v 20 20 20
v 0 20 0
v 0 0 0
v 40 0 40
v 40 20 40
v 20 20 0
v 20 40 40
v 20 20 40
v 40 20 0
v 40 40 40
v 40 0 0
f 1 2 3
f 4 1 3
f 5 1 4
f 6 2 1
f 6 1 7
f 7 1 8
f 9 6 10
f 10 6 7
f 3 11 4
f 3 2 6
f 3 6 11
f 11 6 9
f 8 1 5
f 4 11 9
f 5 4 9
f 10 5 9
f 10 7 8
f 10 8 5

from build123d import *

# Parameters (mm, degrees)
SKETCH1_W            = 40
SKETCH1_H            = 40
BOSS_EXTRUDE1_DEPTH  = 40
SKETCH2_W            = 20
SKETCH2_H            = 20
CUT_EXTRUDE1_DEPTH   = 40
CUT_EXTRUDE2_DEPTH   = 40
CUT_EXTRUDE6_DEPTH   = 40
CUT_EXTRUDE7_DEPTH   = 19.999
SKETCH7_W            = 19.998
SKETCH7_H            = 19.999
CUT_EXTRUDE8_DEPTH   = 19.999
SKETCH8_W            = 19.999
SKETCH8_H            = 19.999
CUT_EXTRUDE9_DEPTH   = 19.999
SKETCH11_W           = 28.28144282
SKETCH11_H           = 19.999
BOSS_EXTRUDE9_DEPTH  = 0.0009
BOSS_EXTRUDE10_DEPTH = 20
SKETCH14_W           = 57
SKETCH14_H           = 20
CUT_EXTRUDE11_DEPTH  = 20


with BuildPart() as part:
    # Sketch1 → Boss-Extrude1 (new body)
    with BuildSketch(Plane.XY):
        with Locations((20, 20)):
            Rectangle(SKETCH1_W, SKETCH1_H)
    extrude(amount=BOSS_EXTRUDE1_DEPTH)

    # Sketch2 → Cut-Extrude1 (cut)
    with BuildSketch(Plane.XY.offset(40)):
        with Locations((10, 30)):
            Rectangle(SKETCH2_W, SKETCH2_H)
    extrude(amount=-CUT_EXTRUDE1_DEPTH, mode=Mode.SUBTRACT)

    # Sketch3 → Cut-Extrude2 (cut)
    with BuildSketch(Plane.ZY.offset(-20)):
        Polygon((0, 20), (40, 40), (0, 40), align=None)
    extrude(amount=-CUT_EXTRUDE2_DEPTH, mode=Mode.SUBTRACT)

    # Sketch4 → Cut-Extrude6 (cut)
    with BuildSketch(Plane(origin=(0, 0, 0), x_dir=(1, 0, 0), z_dir=(0, 1, 0))):
        Polygon((0, 0), (20, -20), (20, -40), (0, -40), align=None)
    extrude(amount=CUT_EXTRUDE6_DEPTH, mode=Mode.SUBTRACT)

    # Sketch6 → Cut-Extrude7 (cut)
    with BuildSketch(Plane(origin=(0, 0, 0), x_dir=(-1, 0, 0), z_dir=(0, -1, 0))):
        Polygon((-20.001, -39.9999), (-39.999, -39.9999), (-20.001, -20.0019), align=None)
    extrude(amount=-CUT_EXTRUDE7_DEPTH, mode=Mode.SUBTRACT)

    # Sketch7 → Cut-Extrude8 (cut)
    with BuildSketch(Plane(origin=(20.001, 0, 0), x_dir=(0, 0, -1), z_dir=(1, 0, 0))):
        with Locations((-30.0009, 9.9995)):
            Rectangle(SKETCH7_W, SKETCH7_H)
    extrude(amount=-CUT_EXTRUDE8_DEPTH, mode=Mode.SUBTRACT)

    # Sketch8 → Cut-Extrude9 (cut)
    with BuildSketch(Plane(origin=(0, 0, 39.9999), x_dir=(-1, 0, 0), z_dir=(0, 0, -1))):
        with Locations((-29.9995, 9.9995)):
            Rectangle(SKETCH8_W, SKETCH8_H)
    extrude(amount=-CUT_EXTRUDE9_DEPTH, mode=Mode.SUBTRACT)

    # Sketch11 → Boss-Extrude9 (add)
    with BuildSketch(Plane(origin=(-0.00045, 0, 0.00045), x_dir=(0.707106781, 0, 0.707106781), z_dir=(-0.707106781, 0, 0.707106781))):
        with Locations((42.427043267, 9.9995)):
            Rectangle(SKETCH11_W, SKETCH11_H)
    extrude(amount=BOSS_EXTRUDE9_DEPTH)

    # Sketch13 → Boss-Extrude10 (add)
    with BuildSketch(Plane(origin=(0, 0, 0), x_dir=(-1, 0, 0), z_dir=(0, -1, 0))):
        Polygon((-20.001, -20.0019), (-20.000363604, -20.002536396), (-20, -20.0019), align=None)
    extrude(amount=-BOSS_EXTRUDE10_DEPTH)

    # Sketch14 → Cut-Extrude11 (cut)
    with BuildSketch(Plane(origin=(0, 0, 0), x_dir=(0.707106781, 0, 0.707106781), z_dir=(-0.707106781, 0, 0.707106781))):
        with Locations((28.5, 10)):
            Rectangle(SKETCH14_W, SKETCH14_H)
    extrude(amount=CUT_EXTRUDE11_DEPTH, mode=Mode.SUBTRACT)


solid = part.part
